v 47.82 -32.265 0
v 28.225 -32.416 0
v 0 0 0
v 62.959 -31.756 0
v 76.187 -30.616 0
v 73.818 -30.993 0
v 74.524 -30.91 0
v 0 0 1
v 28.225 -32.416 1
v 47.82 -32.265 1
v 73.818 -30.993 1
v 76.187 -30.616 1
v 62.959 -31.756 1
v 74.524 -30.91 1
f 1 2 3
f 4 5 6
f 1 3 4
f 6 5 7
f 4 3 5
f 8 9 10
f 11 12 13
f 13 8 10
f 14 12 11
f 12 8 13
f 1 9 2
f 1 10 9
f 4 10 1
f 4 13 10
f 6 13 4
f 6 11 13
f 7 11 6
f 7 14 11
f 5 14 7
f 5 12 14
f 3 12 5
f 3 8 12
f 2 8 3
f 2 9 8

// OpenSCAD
// Generated by SolidPython 1.1.3 on 2024-05-19 23:35:49


linear_extrude(height = 1) {
	polygon(points = [[0, 0], [28.2246843750, -32.4156218750], [28.3038128906, -32.4150144531], [28.3829414063, -32.4144070313], [28.4620699219, -32.4137996094], [28.5411984375, -32.4131921875], [28.6203269531, -32.4125847656], [28.6994554688, -32.4119773438], [28.7785839844, -32.4113699219], [28.8577125000, -32.4107625000], [28.9368410156, -32.4101550781], [29.0159695313, -32.4095476563], [29.0950980469, -32.4089402344], [29.1742265625, -32.4083328125], [29.2533550781, -32.4077253906], [29.3324835938, -32.4071179688], [29.4116121094, -32.4065105469], [29.4907406250, -32.4059031250], [29.5698691406, -32.4052957031], [29.6489976563, -32.4046882813], [29.7281261719, -32.4040808594], [29.8072546875, -32.4034734375], [29.8863832031, -32.4028660156], [29.9655117188, -32.4022585937], [30.0446402344, -32.4016511719], [30.1237687500, -32.4010437500], [30.2028972656, -32.4004363281], [30.2820257813, -32.3998289063], [30.3611542969, -32.3992214844], [30.4402828125, -32.3986140625], [30.5194113281, -32.3980066406], [30.5985398438, -32.3973992188], [30.6776683594, -32.3967917969], [30.7567968750, -32.3961843750], [30.8359253906, -32.3955769531], [30.9150539063, -32.3949695313], [30.9941824219, -32.3943621094], [31.0733109375, -32.3937546875], [31.1524394531, -32.3931472656], [31.2315679688, -32.3925398438], [31.3106964844, -32.3919324219], [31.3898250000, -32.3913250000], [31.4689535156, -32.3907175781], [31.5480820313, -32.3901101563], [31.6272105469, -32.3895027344], [31.7063390625, -32.3888953125], [31.7854675781, -32.3882878906], [31.8645960937, -32.3876804687], [31.9437246094, -32.3870730469], [32.0228531250, -32.3864656250], [32.1019816406, -32.3858582031], [32.1811101562, -32.3852507813], [32.2602386719, -32.3846433594], [32.3393671875, -32.3840359375], [32.4184957031, -32.3834285156], [32.4976242188, -32.3828210938], [32.5767527344, -32.3822136719], [32.6558812500, -32.3816062500], [32.7350097656, -32.3809988281], [32.8141382812, -32.3803914063], [32.8932667969, -32.3797839844], [32.9723953125, -32.3791765625], [33.0515238281, -32.3785691406], [33.1306523438, -32.3779617188], [33.2097808594, -32.3773542969], [33.2889093750, -32.3767468750], [33.3680378906, -32.3761394531], [33.4471664063, -32.3755320313], [33.5262949219, -32.3749246094], [33.6054234375, -32.3743171875], [33.6845519531, -32.3737097656], [33.7636804687, -32.3731023437], [33.8428089844, -32.3724949219], [33.9219375000, -32.3718875000], [34.0010660156, -32.3712800781], [34.0801945313, -32.3706726563], [34.1593230469, -32.3700652344], [34.2384515625, -32.3694578125], [34.3175800781, -32.3688503906], [34.3967085938, -32.3682429688], [34.4758371094, -32.3676355469], [34.5549656250, -32.3670281250], [34.6340941406, -32.3664207031], [34.7132226562, -32.3658132813], [34.7923511719, -32.3652058594], [34.8714796875, -32.3645984375], [34.9506082031, -32.3639910156], [35.0297367188, -32.3633835938], [35.1088652344, -32.3627761719], [35.1879937500, -32.3621687500], [35.2671222656, -32.3615613281], [35.3462507813, -32.3609539063], [35.4253792969, -32.3603464844], [35.5045078125, -32.3597390625], [35.5836363281, -32.3591316406], [35.6627648437, -32.3585242187], [35.7418933594, -32.3579167969], [35.8210218750, -32.3573093750], [35.9001503906, -32.3567019531], [35.9792789063, -32.3560945313], [36.0584074219, -32.3554871094], [36.1375359375, -32.3548796875], [36.2166644531, -32.3542722656], [36.2957929688, -32.3536648438], [36.3749214844, -32.3530574219], [36.4540500000, -32.3524500000], [36.5331785156, -32.3518425781], [36.6123070312, -32.3512351563], [36.6914355469, -32.3506277344], [36.7705640625, -32.3500203125], [36.8496925781, -32.3494128906], [36.9288210938, -32.3488054688], [37.0079496094, -32.3481980469], [37.0870781250, -32.3475906250], [37.1662066406, -32.3469832031], [37.2453351563, -32.3463757813], [37.3244636719, -32.3457683594], [37.4035921875, -32.3451609375], [37.4827207031, -32.3445535156], [37.5618492187, -32.3439460937], [37.6409777344, -32.3433386719], [37.7201062500, -32.3427312500], [37.7992347656, -32.3421238281], [37.8783632813, -32.3415164063], [37.9574917969, -32.3409089844], [38.0366203125, -32.3403015625], [38.1157488281, -32.3396941406], [38.1948773438, -32.3390867188], [38.2740058594, -32.3384792969], [38.3531343750, -32.3378718750], [38.4322628906, -32.3372644531], [38.5113914062, -32.3366570313], [38.5905199219, -32.3360496094], [38.6696484375, -32.3354421875], [38.7487769531, -32.3348347656], [38.8279054688, -32.3342273438], [38.9070339844, -32.3336199219], [38.9861625000, -32.3330125000], [39.0652910156, -32.3324050781], [39.1444195313, -32.3317976563], [39.2235480469, -32.3311902344], [39.3026765625, -32.3305828125], [39.3818050781, -32.3299753906], [39.4609335937, -32.3293679687], [39.5400621094, -32.3287605469], [39.6191906250, -32.3281531250], [39.6983191406, -32.3275457031], [39.7774476563, -32.3269382813], [39.8565761719, -32.3263308594], [39.9357046875, -32.3257234375], [40.0148332031, -32.3251160156], [40.0939617188, -32.3245085938], [40.1730902344, -32.3239011719], [40.2522187500, -32.3232937500], [40.3313472656, -32.3226863281], [40.4104757812, -32.3220789063], [40.4896042969, -32.3214714844], [40.5687328125, -32.3208640625], [40.6478613281, -32.3202566406], [40.7269898438, -32.3196492188], [40.8061183594, -32.3190417969], [40.8852468750, -32.3184343750], [40.9643753906, -32.3178269531], [41.0435039063, -32.3172195313], [41.1226324219, -32.3166121094], [41.2017609375, -32.3160046875], [41.2808894531, -32.3153972656], [41.3600179688, -32.3147898437], [41.4391464844, -32.3141824219], [41.5182750000, -32.3135750000], [41.5974035156, -32.3129675781], [41.6765320313, -32.3123601563], [41.7556605469, -32.3117527344], [41.8347890625, -32.3111453125], [41.9139175781, -32.3105378906], [41.9930460937, -32.3099304688], [42.0721746094, -32.3093230469], [42.1513031250, -32.3087156250], [42.2304316406, -32.3081082031], [42.3095601563, -32.3075007813], [42.3886886719, -32.3068933594], [42.4678171875, -32.3062859375], [42.5469457031, -32.3056785156], [42.6260742188, -32.3050710938], [42.7052027344, -32.3044636719], [42.7843312500, -32.3038562500], [42.8634597656, -32.3032488281], [42.9425882812, -32.3026414063], [43.0217167969, -32.3020339844], [43.1008453125, -32.3014265625], [43.1799738281, -32.3008191406], [43.2591023438, -32.3002117187], [43.3382308594, -32.2996042969], [43.4173593750, -32.2989968750], [43.4964878906, -32.2983894531], [43.5756164063, -32.2977820313], [43.6547449219, -32.2971746094], [43.7338734375, -32.2965671875], [43.8130019531, -32.2959597656], [43.8921304687, -32.2953523438], [43.9712589844, -32.2947449219], [44.0503875000, -32.2941375000], [44.1295160156, -32.2935300781], [44.2086445313, -32.2929226563], [44.2877730469, -32.2923152344], [44.3669015625, -32.2917078125], [44.4460300781, -32.2911003906], [44.5251585938, -32.2904929688], [44.6042871094, -32.2898855469], [44.6834156250, -32.2892781250], [44.7625441406, -32.2886707031], [44.8416726562, -32.2880632813], [44.9208011719, -32.2874558594], [44.9999296875, -32.2868484375], [45.0790582031, -32.2862410156], [45.1581867188, -32.2856335937], [45.2373152344, -32.2850261719], [45.3164437500, -32.2844187500], [45.3955722656, -32.2838113281], [45.4747007813, -32.2832039063], [45.5538292969, -32.2825964844], [45.6329578125, -32.2819890625], [45.7120863281, -32.2813816406], [45.7912148437, -32.2807742188], [45.8703433594, -32.2801667969], [45.9494718750, -32.2795593750], [46.0286003906, -32.2789519531], [46.1077289063, -32.2783445313], [46.1868574219, -32.2777371094], [46.2659859375, -32.2771296875], [46.3451144531, -32.2765222656], [46.4242429688, -32.2759148438], [46.5033714844, -32.2753074219], [46.5825000000, -32.2747000000], [46.6598500000, -32.2741062500], [46.7372000000, -32.2735125000], [46.8145500000, -32.2729187500], [46.8919000000, -32.2723250000], [46.9692500000, -32.2717312500], [47.0466000000, -32.2711375000], [47.1239500000, -32.2705437500], [47.2013000000, -32.2699500000], [47.2786500000, -32.2693562500], [47.3560000000, -32.2687625000], [47.4333500000, -32.2681687500], [47.5107000000, -32.2675750000], [47.5880500000, -32.2669812500], [47.6654000000, -32.2663875000], [47.7427500000, -32.2657937500], [47.8201000000, -32.2652000000], [47.9144859375, -32.2620242187], [48.0088718750, -32.2588484375], [48.1032578125, -32.2556726563], [48.1976437500, -32.2524968750], [48.2920296875, -32.2493210938], [48.3864156250, -32.2461453125], [48.4808015625, -32.2429695313], [48.5751875000, -32.2397937500], [48.6695734375, -32.2366179688], [48.7639593750, -32.2334421875], [48.8583453125, -32.2302664063], [48.9527312500, -32.2270906250], [49.0471171875, -32.2239148438], [49.1415031250, -32.2207390625], [49.2358890625, -32.2175632813], [49.3302750000, -32.2143875000], [49.4246609375, -32.2112117188], [49.5190468750, -32.2080359375], [49.6134328125, -32.2048601562], [49.7078187500, -32.2016843750], [49.8022046875, -32.1985085937], [49.8965906250, -32.1953328125], [49.9909765625, -32.1921570312], [50.0853625000, -32.1889812500], [50.1797484375, -32.1858054687], [50.2741343750, -32.1826296875], [50.3685203125, -32.1794539062], [50.4629062500, -32.1762781250], [50.5572921875, -32.1731023437], [50.6516781250, -32.1699265625], [50.7460640625, -32.1667507812], [50.8404500000, -32.1635750000], [50.9348359375, -32.1603992187], [51.0292218750, -32.1572234375], [51.1236078125, -32.1540476562], [51.2179937500, -32.1508718750], [51.3123796875, -32.1476960937], [51.4067656250, -32.1445203125], [51.5011515625, -32.1413445312], [51.5955375000, -32.1381687500], [51.6899234375, -32.1349929687], [51.7843093750, -32.1318171875], [51.8786953125, -32.1286414062], [51.9730812500, -32.1254656250], [52.0674671875, -32.1222898437], [52.1618531250, -32.1191140625], [52.2562390625, -32.1159382812], [52.3506250000, -32.1127625000], [52.4450109375, -32.1095867187], [52.5393968750, -32.1064109375], [52.6337828125, -32.1032351563], [52.7281687500, -32.1000593750], [52.8225546875, -32.0968835938], [52.9169406250, -32.0937078125], [53.0113265625, -32.0905320312], [53.1057125000, -32.0873562500], [53.2000984375, -32.0841804687], [53.2944843750, -32.0810046875], [53.3888703125, -32.0778289062], [53.4832562500, -32.0746531250], [53.5776421875, -32.0714773437], [53.6720281250, -32.0683015625], [53.7664140625, -32.0651257812], [53.8608000000, -32.0619500000], [53.9551859375, -32.0587742187], [54.0495718750, -32.0555984375], [54.1439578125, -32.0524226562], [54.2383437500, -32.0492468750], [54.3327296875, -32.0460710937], [54.4271156250, -32.0428953125], [54.5215015625, -32.0397195312], [54.6158875000, -32.0365437500], [54.7102734375, -32.0333679687], [54.8046593750, -32.0301921875], [54.8990453125, -32.0270164062], [54.9934312500, -32.0238406250], [55.0878171875, -32.0206648437], [55.1822031250, -32.0174890625], [55.2765890625, -32.0143132812], [55.3709750000, -32.0111375000], [55.4653609375, -32.0079617187], [55.5597468750, -32.0047859375], [55.6541328125, -32.0016101562], [55.7485187500, -31.9984343750], [55.8429046875, -31.9952585937], [55.9372906250, -31.9920828125], [56.0316765625, -31.9889070312], [56.1260625000, -31.9857312500], [56.2204484375, -31.9825554688], [56.3148343750, -31.9793796875], [56.4092203125, -31.9762039062], [56.5036062500, -31.9730281250], [56.5979921875, -31.9698523437], [56.6923781250, -31.9666765625], [56.7867640625, -31.9635007812], [56.8811500000, -31.9603250000], [56.9755359375, -31.9571492187], [57.0699218750, -31.9539734375], [57.1643078125, -31.9507976562], [57.2586937500, -31.9476218750], [57.3530796875, -31.9444460937], [57.4474656250, -31.9412703125], [57.5418515625, -31.9380945312], [57.6362375000, -31.9349187500], [57.7306234375, -31.9317429688], [57.8250093750, -31.9285671875], [57.9193953125, -31.9253914063], [58.0137812500, -31.9222156250], [58.1081671875, -31.9190398437], [58.2025531250, -31.9158640625], [58.2969390625, -31.9126882812], [58.3913250000, -31.9095125000], [58.4857109375, -31.9063367187], [58.5800968750, -31.9031609375], [58.6744828125, -31.8999851562], [58.7688687500, -31.8968093750], [58.8632546875, -31.8936335937], [58.9576406250, -31.8904578125], [59.0520265625, -31.8872820312], [59.1464125000, -31.8841062500], [59.2407984375, -31.8809304688], [59.3351843750, -31.8777546875], [59.4295703125, -31.8745789063], [59.5239562500, -31.8714031250], [59.6183421875, -31.8682273438], [59.7127281250, -31.8650515625], [59.8071140625, -31.8618757812], [59.9015000000, -31.8587000000], [59.9970562500, -31.8554875000], [60.0926125000, -31.8522750000], [60.1881687500, -31.8490625000], [60.2837250000, -31.8458500000], [60.3792812500, -31.8426375000], [60.4748375000, -31.8394250000], [60.5703937500, -31.8362125000], [60.6659500000, -31.8330000000], [60.7615062500, -31.8297875000], [60.8570625000, -31.8265750000], [60.9526187500, -31.8233625000], [61.0481750000, -31.8201500000], [61.1437312500, -31.8169375000], [61.2392875000, -31.8137250000], [61.3348437500, -31.8105125000], [61.4304000000, -31.8073000000], [61.5259562500, -31.8040875000], [61.6215125000, -31.8008750000], [61.7170687500, -31.7976625000], [61.8126250000, -31.7944500000], [61.9081812500, -31.7912375000], [62.0037375000, -31.7880250000], [62.0992937500, -31.7848125000], [62.1948500000, -31.7816000000], [62.2904062500, -31.7783875000], [62.3859625000, -31.7751750000], [62.4815187500, -31.7719625000], [62.5770750000, -31.7687500000], [62.6726312500, -31.7655375000], [62.7681875000, -31.7623250000], [62.8637437500, -31.7591125000], [62.9593000000, -31.7559000000], [63.0493953125, -31.7495718750], [63.1394906250, -31.7432437500], [63.2295859375, -31.7369156250], [63.3196812500, -31.7305875000], [63.4097765625, -31.7242593750], [63.4998718750, -31.7179312500], [63.5899671875, -31.7116031250], [63.6800625000, -31.7052750000], [63.7701578125, -31.6989468750], [63.8602531250, -31.6926187500], [63.9503484375, -31.6862906250], [64.0404437500, -31.6799625000], [64.1305390625, -31.6736343750], [64.2206343750, -31.6673062500], [64.3107296875, -31.6609781250], [64.4008250000, -31.6546500000], [64.4909203125, -31.6483218750], [64.5810156250, -31.6419937500], [64.6711109375, -31.6356656250], [64.7612062500, -31.6293375000], [64.8513015625, -31.6230093750], [64.9413968750, -31.6166812500], [65.0314921875, -31.6103531250], [65.1215875000, -31.6040250000], [65.2116828125, -31.5976968750], [65.3017781250, -31.5913687500], [65.3918734375, -31.5850406250], [65.4819687500, -31.5787125000], [65.5720640625, -31.5723843750], [65.6621593750, -31.5660562500], [65.7522546875, -31.5597281250], [65.8423500000, -31.5534000000], [65.9324453125, -31.5470718750], [66.0225406250, -31.5407437500], [66.1126359375, -31.5344156250], [66.2027312500, -31.5280875000], [66.2928265625, -31.5217593750], [66.3829218750, -31.5154312500], [66.4730171875, -31.5091031250], [66.5631125000, -31.5027750000], [66.6532078125, -31.4964468750], [66.7433031250, -31.4901187500], [66.8333984375, -31.4837906250], [66.9234937500, -31.4774625000], [67.0135890625, -31.4711343750], [67.1036843750, -31.4648062500], [67.1937796875, -31.4584781250], [67.2838750000, -31.4521500000], [67.3739703125, -31.4458218750], [67.4640656250, -31.4394937500], [67.5541609375, -31.4331656250], [67.6442562500, -31.4268375000], [67.7343515625, -31.4205093750], [67.8244468750, -31.4141812500], [67.9145421875, -31.4078531250], [68.0046375000, -31.4015250000], [68.0947328125, -31.3951968750], [68.1848281250, -31.3888687500], [68.2749234375, -31.3825406250], [68.3650187500, -31.3762125000], [68.4551140625, -31.3698843750], [68.5452093750, -31.3635562500], [68.6353046875, -31.3572281250], [68.7254000000, -31.3509000000], [68.8049750000, -31.3453109375], [68.8845500000, -31.3397218750], [68.9641250000, -31.3341328125], [69.0437000000, -31.3285437500], [69.1232750000, -31.3229546875], [69.2028500000, -31.3173656250], [69.2824250000, -31.3117765625], [69.3620000000, -31.3061875000], [69.4415750000, -31.3005984375], [69.5211500000, -31.2950093750], [69.6007250000, -31.2894203125], [69.6803000000, -31.2838312500], [69.7598750000, -31.2782421875], [69.8394500000, -31.2726531250], [69.9190250000, -31.2670640625], [69.9986000000, -31.2614750000], [70.0781750000, -31.2558859375], [70.1577500000, -31.2502968750], [70.2373250000, -31.2447078125], [70.3169000000, -31.2391187500], [70.3964750000, -31.2335296875], [70.4760500000, -31.2279406250], [70.5556250000, -31.2223515625], [70.6352000000, -31.2167625000], [70.7147750000, -31.2111734375], [70.7943500000, -31.2055843750], [70.8739250000, -31.1999953125], [70.9535000000, -31.1944062500], [71.0330750000, -31.1888171875], [71.1126500000, -31.1832281250], [71.1922250000, -31.1776390625], [71.2718000000, -31.1720500000], [71.3513750000, -31.1664609375], [71.4309500000, -31.1608718750], [71.5105250000, -31.1552828125], [71.5901000000, -31.1496937500], [71.6696750000, -31.1441046875], [71.7492500000, -31.1385156250], [71.8288250000, -31.1329265625], [71.9084000000, -31.1273375000], [71.9879750000, -31.1217484375], [72.0675500000, -31.1161593750], [72.1471250000, -31.1105703125], [72.2267000000, -31.1049812500], [72.3062750000, -31.0993921875], [72.3858500000, -31.0938031250], [72.4654250000, -31.0882140625], [72.5450000000, -31.0826250000], [72.6245750000, -31.0770359375], [72.7041500000, -31.0714468750], [72.7837250000, -31.0658578125], [72.8633000000, -31.0602687500], [72.9428750000, -31.0546796875], [73.0224500000, -31.0490906250], [73.1020250000, -31.0435015625], [73.1816000000, -31.0379125000], [73.2611750000, -31.0323234375], [73.3407500000, -31.0267343750], [73.4203250000, -31.0211453125], [73.4999000000, -31.0155562500], [73.5794750000, -31.0099671875], [73.6590500000, -31.0043781250], [73.7386250000, -30.9987890625], [73.8182000000, -30.9932000000], [73.8795750000, -30.9859250000], [73.9409500000, -30.9786500000], [74.0023250000, -30.9713750000], [74.0637000000, -30.9641000000], [74.1212375000, -30.9572875000], [74.1787750000, -30.9504750000], [74.2363125000, -30.9436625000], [74.2938500000, -30.9368500000], [74.3513875000, -30.9300375000], [74.4089250000, -30.9232250000], [74.4664625000, -30.9164125000], [74.5240000000, -30.9096000000], [74.6106375000, -30.8943187500], [74.6972750000, -30.8790375000], [74.7839125000, -30.8637562500], [74.8705500000, -30.8484750000], [74.9571875000, -30.8331937500], [75.0438250000, -30.8179125000], [75.1304625000, -30.8026312500], [75.2171000000, -30.7873500000], [75.3037375000, -30.7720687500], [75.3903750000, -30.7567875000], [75.4770125000, -30.7415062500], [75.5636500000, -30.7262250000], [75.6502875000, -30.7109437500], [75.7369250000, -30.6956625000], [75.8235625000, -30.6803812500], [75.9102000000, -30.6651000000], [75.9655187500, -30.6553375000], [76.0208375000, -30.6455750000], [76.0761562500, -30.6358125000], [76.1314750000, -30.6260500000], [76.1867937500, -30.6162875000]]);
}
/***********************************************
*********      SolidPython code:      **********
************************************************
 
import math
import time

from stl import mesh, Dimension

from tkinter import Tk     # from tkinter import Tk for Python 3.x
from tkinter.filedialog import askopenfilename
from mpl_toolkits.mplot3d import art3d
from matplotlib import pyplot as plt
import solid
import os
import ezdxf
import shapely.geometry as sg
import subprocess
from GUI import getSCADPath



def outputSTL(From, To, PATH=getSCADPath()):
    subprocess.Popen(PATH + " -o " + To + " " + From)
    while not os.path.exists(To):
        time.sleep(1)


def get_size(i):
    x_list = [int(a) for a in str(i)]
    return len(x_list)



class Model:
    def __init__(self, model, fileName, location, layer, thickness):
        self.location = location
        self.code = None
        self.fileName = fileName
        self.stl = fileName + ".stl"
        self.layer = layer
        self.thickness = thickness
        self.maxz = (layer+1)*thickness
        self.dxf = fileName + ".dxf"
        self.scad = fileName + ".scad"
        self.model = model
        self.center = None
        self.width = 10
        self.mesh = None
        self.useable_area = None


    def get_code(self):
        max_dim = 0.05
        max_array = 6

        num = int(self.fileName)
        nums = [int(a) for a in str(num)]
        nums.reverse()
        indices = nums
        length = len(nums)

        print(indices)
        t = 0
        i = 0
        cubes = []
        x = 0
        y = 0
        width = 0.01
        while x <= max_dim:
            while y <= max_dim:
                print(indices)
                if nums == []:
                    break
                if indices[0] != 0:
                    cubes.append(solid.translate([x, y, 0])(solid.cube(size=t / 1000 + 0.001)))
                    y += max_dim / (max_array - 1)
                    nums[0] = nums[0] - 1
                else:
                    indices.pop(0)
                    t += 1
                i += 1
            x += max_dim / (max_array - 1)
            y = 0

        outside = solid.translate([-width / 2, -width / 2])(solid.cube(max_dim + (length - 1) / 1000 + 0.001 + width))
        self.code = solid.difference()(outside, cubes)
        self.code = solid.projection(cut=True)(self.code)
        solid.scad_render_to_file(self.code, self.location + "/code.scad")
        outputSTL(From=self.location+"/code.scad", To=self.location+"code.dxf", PATH=getSCADPath())
        # os.system("toSTL.sh renders/code.scad renders/code.dxf")
        return self.location+"/code.dxf"

    def download(self, type):
        if type =="stl":
            print("generating:" + self.location+"/"+ self.fileName+".stl")
            outputSTL(From=self.location+"/"+self.fileName+".scad", To=self.location+"/"+self.fileName+".stl")
            # os.system("toSTL.sh renders/"+ self.fileName+".scad renders/"+ self.fileName+".stl")
        elif type == "dxf":
            outputSTL(From=self.location+"/"+self.fileName+".scad", To=self.location+"/"+self.fileName+".dxf")
            # os.system("toSTL.sh renders/"+ self.fileName+".scad renders/"+ self.fileName+".dxf")

    def render(self):
        solid.scad_render_to_file(self.model, self.location+"/"+ self.fileName+'.scad')
        while not os.path.exists(self.location+"/"+self.fileName+".scad"):
            time.sleep(1)

    def get_points(self):
        doc = ezdxf.readfile(filename=self.location+"/"+ self.fileName+".dxf")
        msp = doc.modelspace()
        i=0
        lists = []
        def helper(e):
            start = [e.dxf.start[0], e.dxf.start[1]]
            end = [e.dxf.end[0], e.dxf.end[1]]
            return [start, end]

        for e in msp.query("LINE"):
            line = helper(e)
            if not lists:
                lists.append([line])
            else:
                if lists[i][len(lists)-1][1] != line[0]:
                    lists.append([line])
                    i+=1
                else:
                    lists[i].append(line)

    def get_points2(self, FILE):
        doc = ezdxf.readfile(filename=FILE)
        msp = doc.modelspace()
        i = 0
        lists = []

        def helper(e):
            start = [e.dxf.start[0], e.dxf.start[1]]
            end = [e.dxf.end[0], e.dxf.end[1]]
            return (start, end)

        for e in msp.query("LINE"):
            line = helper(e)
            if lists==[]:
                lists.append([line])
            else:
                if lists[i][len(lists[i]) - 1][1] != line[0]:
                    lists.append([line])
                    i += 1
                else:
                    lists[i].append(line)
        return lists

    def add_code(self):
        dxf = solid.projection(cut=False)(self.model)
        offset = solid.offset(r=-0.1)(dxf)
        solid.scad_render_to_file(offset, self.location+'/offset.scad')
        os.system("toSTL.sh renders/offset.scad renders/offset.dxf")
        lines = self.get_points2("renders/offset.dxf")
        x = lines[0][0][0][0]
        y = lines[0][0][0][1]
        print(x)
        print(y)
        code = solid.translate([x,y,0])(self.code)
        code = solid.linear_extrude(height=999)(code)
        save = self.model
        self.model = solid.projection()(solid.difference()(self.model, code))
        self.render()
        self.download("dxf")
        self.model = save

    def add_label(self, pos):
        # num = 12
        # minx, maxx, miny, maxy, minz, maxz = self.find_minmax()
        maxz = self.maxz
        # label = solid.linear_extrude(height=(maxz-minz)/3)(solid.text(str(self.fileName), size=0.5, halign="center"))
        # i=minx
        # print("x-len: " + str(maxx-minx))
        # print(i)
        # inc = (maxx-minx)/num
        # while minx <= i <= maxx:
        #     label = solid.union()(solid.translate([i, 0, maxz - 0.2])(solid.linear_extrude(height=(maxz-minz)/3)(solid.text(str(self.fileName), size=0.25, halign="center"))), label)
        #     i += inc
        #
        # l = label
        #
        # i =miny
        # while miny<= i <= maxy:
        #     print("y inc")
        #     l = solid.union()(solid.translate([0, i, 0])(label), l)
        #     i += 0.5
        for i in str(self.fileName):
            cur = pos[0]
            label = solid.translate([pos[0][0], pos[0][1], self.maxz-0.2])(solid.linear_extrude(height=(self.thickness)/3)(solid.text(str(i), size=0.5, halign="center", valign="center")))
            self.model = solid.difference()(self.model, label)
            pos.append(pos.pop(0))
            while abs(cur[0]-pos[0][0])<0.5 and abs(cur[1]-pos[0][1])<0.5:
                pos.append(pos.pop(0))



    def Center(self):

        volume, cog, inertia = self.mesh.get_mass_properties()
        print("Volume                                  = {0}".format(volume))
        print("Position of the center of gravity (COG) = {0}".format(cog))
        m_centered = solid.translate([-cog[0], -cog[1], 0])(
            self.model
        )
        return m_centered

    def find_minmax(self):
        minx = maxx = miny = maxy = minz = maxz = None
        for p in self.mesh.points:
            # p contains (x, y, z)
            if minx is None:
                minx = p[Dimension.X]
                maxx = p[Dimension.X]
                miny = p[Dimension.Y]
                maxy = p[Dimension.Y]
                minz = p[Dimension.Z]
                maxz = p[Dimension.Z]
            else:
                maxx = max(p[Dimension.X], maxx)
                minx = min(p[Dimension.X], minx)
                maxy = max(p[Dimension.Y], maxy)
                miny = min(p[Dimension.Y], miny)
                maxz = max(p[Dimension.Z], maxz)
                minz = min(p[Dimension.Z], minz)
        lenx = maxx - minx
        leny = maxy - miny
        lenz = maxz - minz
        return minx, maxx, miny, maxy, minz, maxz

    # def generate_Mesh(self):
    #     self.mesh = mesh.Mesh.from_file(self.location + "/" + str(int(self.fileName)//8)+ "b.stl")

    def get_top(self):
        top = solid.projection(cut=True)(solid.translate([0,0,-1*self.thickness*(self.layer+1)])(self.model))
        useable_area = solid.offset(r=-0.45)(top)
        self.useable_area = useable_area
        solid.scad_render_to_file(self.useable_area, self.location+'/' + 'toptemp.scad')
        outputSTL(From=self.location+'/' + 'toptemp.scad', To=self.location+"/top"+ self.dxf)

        # os.system("toSTL.sh out/toptemp.scad renders/" + self.fileName + ".dxf")
        dxf = DXF(self.location+"/top"+ self.dxf)
        min_p=dxf.points[0][0]
        points_ordered = dxf.points
        i=0
        while i <= len(dxf.points)+1:
            while math.sqrt((dxf.points[0][0]-dxf.points[1][0])**2+(dxf.points[0][1]-dxf.points[1][1])**2) > 0.1:
                dxf.points.insert(1, [(dxf.points[0][0]+dxf.points[1][0])/2, (dxf.points[0][1]+dxf.points[1][1])/2])
                i = i-1
            dxf.points.append(dxf.points.pop(0))
            i+=1
        for i in range(len(dxf.points)):
            dxf.points.append(dxf.points.pop(0))
            if dxf.points[0][0] < min_p:
                min_p = dxf.points[0][0]
                points_ordered = dxf.points.copy()
        dxf.points = points_ordered.copy()

        print(dxf.points)
        self.add_label(dxf.points)

class DXF:
    def __init__(self, file):
        self.file = file
        self.Lines = []
        self.points = []
        doc = ezdxf.readfile(self.file)
        msp = doc.modelspace()
        for e in msp:
            if e.dxftype() == "LINE":
                self.Lines.append(e)
                self.points.append([e.dxf.start[0], e.dxf.start[1]])
        # self.points.append([self.Lines[-1].dxf.end[0], self.Lines[-1].dxf.end[1]])
        self.area = None
        self.center = None
        self.polygon = sg.Polygon(self.points)

    def get_area(self):
        self.area = self.polygon.area
        return self.area

    def get_center(self):
        x_sum = 0
        y_sum =0
        for i in self.points:
            x_sum += i[0]
            y_sum += i[1]
        x_c = x_sum/len(self.points)
        y_c = y_sum/len(self.points)
        return (x_c, y_c)

    def split(self, maxdim):
        splits = []
        length = 0
        pieces = [[]]
        prev = self.points[0]
        for j in self.points:
            length = length + math.sqrt((prev[0]-j[0])**2+(prev[1]-j[1])**2)
            if length >= maxdim:
                pieces[-1].append(j)
                pieces.append([])
                length = 0
            pieces[-1].append(j)
            prev = j
        for j in pieces:
            j.insert(0, [0,0])
            piece = solid.linear_extrude(height=1)(solid.polygon(j))
            splits.append(piece)
        return splits
    def refine_points(self):
        i=0
        while i <= len(self.points)+1:
            while math.sqrt((self.points[0][0]-self.points[1][0])**2+(self.points[0][1]-self.points[1][1])**2) > 0.1:
                self.points.insert(1, [(self.points[0][0]+self.points[1][0])/2, (self.points[0][1]+self.points[1][1])/2])
                i = i-1
            self.points.append(self.points.pop(0))
            i+=1


if __name__== "__main__":
    test = DXF("C:/Users/Daniel/Documents/repos/Shell_Maker/output/0top_slice.dxf")
    test.refine_points()
    k = test.split(48)
    for i in range(len(k)):
        solid.scad_render_to_file(k[i], str(i) + ".scad")


 
 
************************************************/
